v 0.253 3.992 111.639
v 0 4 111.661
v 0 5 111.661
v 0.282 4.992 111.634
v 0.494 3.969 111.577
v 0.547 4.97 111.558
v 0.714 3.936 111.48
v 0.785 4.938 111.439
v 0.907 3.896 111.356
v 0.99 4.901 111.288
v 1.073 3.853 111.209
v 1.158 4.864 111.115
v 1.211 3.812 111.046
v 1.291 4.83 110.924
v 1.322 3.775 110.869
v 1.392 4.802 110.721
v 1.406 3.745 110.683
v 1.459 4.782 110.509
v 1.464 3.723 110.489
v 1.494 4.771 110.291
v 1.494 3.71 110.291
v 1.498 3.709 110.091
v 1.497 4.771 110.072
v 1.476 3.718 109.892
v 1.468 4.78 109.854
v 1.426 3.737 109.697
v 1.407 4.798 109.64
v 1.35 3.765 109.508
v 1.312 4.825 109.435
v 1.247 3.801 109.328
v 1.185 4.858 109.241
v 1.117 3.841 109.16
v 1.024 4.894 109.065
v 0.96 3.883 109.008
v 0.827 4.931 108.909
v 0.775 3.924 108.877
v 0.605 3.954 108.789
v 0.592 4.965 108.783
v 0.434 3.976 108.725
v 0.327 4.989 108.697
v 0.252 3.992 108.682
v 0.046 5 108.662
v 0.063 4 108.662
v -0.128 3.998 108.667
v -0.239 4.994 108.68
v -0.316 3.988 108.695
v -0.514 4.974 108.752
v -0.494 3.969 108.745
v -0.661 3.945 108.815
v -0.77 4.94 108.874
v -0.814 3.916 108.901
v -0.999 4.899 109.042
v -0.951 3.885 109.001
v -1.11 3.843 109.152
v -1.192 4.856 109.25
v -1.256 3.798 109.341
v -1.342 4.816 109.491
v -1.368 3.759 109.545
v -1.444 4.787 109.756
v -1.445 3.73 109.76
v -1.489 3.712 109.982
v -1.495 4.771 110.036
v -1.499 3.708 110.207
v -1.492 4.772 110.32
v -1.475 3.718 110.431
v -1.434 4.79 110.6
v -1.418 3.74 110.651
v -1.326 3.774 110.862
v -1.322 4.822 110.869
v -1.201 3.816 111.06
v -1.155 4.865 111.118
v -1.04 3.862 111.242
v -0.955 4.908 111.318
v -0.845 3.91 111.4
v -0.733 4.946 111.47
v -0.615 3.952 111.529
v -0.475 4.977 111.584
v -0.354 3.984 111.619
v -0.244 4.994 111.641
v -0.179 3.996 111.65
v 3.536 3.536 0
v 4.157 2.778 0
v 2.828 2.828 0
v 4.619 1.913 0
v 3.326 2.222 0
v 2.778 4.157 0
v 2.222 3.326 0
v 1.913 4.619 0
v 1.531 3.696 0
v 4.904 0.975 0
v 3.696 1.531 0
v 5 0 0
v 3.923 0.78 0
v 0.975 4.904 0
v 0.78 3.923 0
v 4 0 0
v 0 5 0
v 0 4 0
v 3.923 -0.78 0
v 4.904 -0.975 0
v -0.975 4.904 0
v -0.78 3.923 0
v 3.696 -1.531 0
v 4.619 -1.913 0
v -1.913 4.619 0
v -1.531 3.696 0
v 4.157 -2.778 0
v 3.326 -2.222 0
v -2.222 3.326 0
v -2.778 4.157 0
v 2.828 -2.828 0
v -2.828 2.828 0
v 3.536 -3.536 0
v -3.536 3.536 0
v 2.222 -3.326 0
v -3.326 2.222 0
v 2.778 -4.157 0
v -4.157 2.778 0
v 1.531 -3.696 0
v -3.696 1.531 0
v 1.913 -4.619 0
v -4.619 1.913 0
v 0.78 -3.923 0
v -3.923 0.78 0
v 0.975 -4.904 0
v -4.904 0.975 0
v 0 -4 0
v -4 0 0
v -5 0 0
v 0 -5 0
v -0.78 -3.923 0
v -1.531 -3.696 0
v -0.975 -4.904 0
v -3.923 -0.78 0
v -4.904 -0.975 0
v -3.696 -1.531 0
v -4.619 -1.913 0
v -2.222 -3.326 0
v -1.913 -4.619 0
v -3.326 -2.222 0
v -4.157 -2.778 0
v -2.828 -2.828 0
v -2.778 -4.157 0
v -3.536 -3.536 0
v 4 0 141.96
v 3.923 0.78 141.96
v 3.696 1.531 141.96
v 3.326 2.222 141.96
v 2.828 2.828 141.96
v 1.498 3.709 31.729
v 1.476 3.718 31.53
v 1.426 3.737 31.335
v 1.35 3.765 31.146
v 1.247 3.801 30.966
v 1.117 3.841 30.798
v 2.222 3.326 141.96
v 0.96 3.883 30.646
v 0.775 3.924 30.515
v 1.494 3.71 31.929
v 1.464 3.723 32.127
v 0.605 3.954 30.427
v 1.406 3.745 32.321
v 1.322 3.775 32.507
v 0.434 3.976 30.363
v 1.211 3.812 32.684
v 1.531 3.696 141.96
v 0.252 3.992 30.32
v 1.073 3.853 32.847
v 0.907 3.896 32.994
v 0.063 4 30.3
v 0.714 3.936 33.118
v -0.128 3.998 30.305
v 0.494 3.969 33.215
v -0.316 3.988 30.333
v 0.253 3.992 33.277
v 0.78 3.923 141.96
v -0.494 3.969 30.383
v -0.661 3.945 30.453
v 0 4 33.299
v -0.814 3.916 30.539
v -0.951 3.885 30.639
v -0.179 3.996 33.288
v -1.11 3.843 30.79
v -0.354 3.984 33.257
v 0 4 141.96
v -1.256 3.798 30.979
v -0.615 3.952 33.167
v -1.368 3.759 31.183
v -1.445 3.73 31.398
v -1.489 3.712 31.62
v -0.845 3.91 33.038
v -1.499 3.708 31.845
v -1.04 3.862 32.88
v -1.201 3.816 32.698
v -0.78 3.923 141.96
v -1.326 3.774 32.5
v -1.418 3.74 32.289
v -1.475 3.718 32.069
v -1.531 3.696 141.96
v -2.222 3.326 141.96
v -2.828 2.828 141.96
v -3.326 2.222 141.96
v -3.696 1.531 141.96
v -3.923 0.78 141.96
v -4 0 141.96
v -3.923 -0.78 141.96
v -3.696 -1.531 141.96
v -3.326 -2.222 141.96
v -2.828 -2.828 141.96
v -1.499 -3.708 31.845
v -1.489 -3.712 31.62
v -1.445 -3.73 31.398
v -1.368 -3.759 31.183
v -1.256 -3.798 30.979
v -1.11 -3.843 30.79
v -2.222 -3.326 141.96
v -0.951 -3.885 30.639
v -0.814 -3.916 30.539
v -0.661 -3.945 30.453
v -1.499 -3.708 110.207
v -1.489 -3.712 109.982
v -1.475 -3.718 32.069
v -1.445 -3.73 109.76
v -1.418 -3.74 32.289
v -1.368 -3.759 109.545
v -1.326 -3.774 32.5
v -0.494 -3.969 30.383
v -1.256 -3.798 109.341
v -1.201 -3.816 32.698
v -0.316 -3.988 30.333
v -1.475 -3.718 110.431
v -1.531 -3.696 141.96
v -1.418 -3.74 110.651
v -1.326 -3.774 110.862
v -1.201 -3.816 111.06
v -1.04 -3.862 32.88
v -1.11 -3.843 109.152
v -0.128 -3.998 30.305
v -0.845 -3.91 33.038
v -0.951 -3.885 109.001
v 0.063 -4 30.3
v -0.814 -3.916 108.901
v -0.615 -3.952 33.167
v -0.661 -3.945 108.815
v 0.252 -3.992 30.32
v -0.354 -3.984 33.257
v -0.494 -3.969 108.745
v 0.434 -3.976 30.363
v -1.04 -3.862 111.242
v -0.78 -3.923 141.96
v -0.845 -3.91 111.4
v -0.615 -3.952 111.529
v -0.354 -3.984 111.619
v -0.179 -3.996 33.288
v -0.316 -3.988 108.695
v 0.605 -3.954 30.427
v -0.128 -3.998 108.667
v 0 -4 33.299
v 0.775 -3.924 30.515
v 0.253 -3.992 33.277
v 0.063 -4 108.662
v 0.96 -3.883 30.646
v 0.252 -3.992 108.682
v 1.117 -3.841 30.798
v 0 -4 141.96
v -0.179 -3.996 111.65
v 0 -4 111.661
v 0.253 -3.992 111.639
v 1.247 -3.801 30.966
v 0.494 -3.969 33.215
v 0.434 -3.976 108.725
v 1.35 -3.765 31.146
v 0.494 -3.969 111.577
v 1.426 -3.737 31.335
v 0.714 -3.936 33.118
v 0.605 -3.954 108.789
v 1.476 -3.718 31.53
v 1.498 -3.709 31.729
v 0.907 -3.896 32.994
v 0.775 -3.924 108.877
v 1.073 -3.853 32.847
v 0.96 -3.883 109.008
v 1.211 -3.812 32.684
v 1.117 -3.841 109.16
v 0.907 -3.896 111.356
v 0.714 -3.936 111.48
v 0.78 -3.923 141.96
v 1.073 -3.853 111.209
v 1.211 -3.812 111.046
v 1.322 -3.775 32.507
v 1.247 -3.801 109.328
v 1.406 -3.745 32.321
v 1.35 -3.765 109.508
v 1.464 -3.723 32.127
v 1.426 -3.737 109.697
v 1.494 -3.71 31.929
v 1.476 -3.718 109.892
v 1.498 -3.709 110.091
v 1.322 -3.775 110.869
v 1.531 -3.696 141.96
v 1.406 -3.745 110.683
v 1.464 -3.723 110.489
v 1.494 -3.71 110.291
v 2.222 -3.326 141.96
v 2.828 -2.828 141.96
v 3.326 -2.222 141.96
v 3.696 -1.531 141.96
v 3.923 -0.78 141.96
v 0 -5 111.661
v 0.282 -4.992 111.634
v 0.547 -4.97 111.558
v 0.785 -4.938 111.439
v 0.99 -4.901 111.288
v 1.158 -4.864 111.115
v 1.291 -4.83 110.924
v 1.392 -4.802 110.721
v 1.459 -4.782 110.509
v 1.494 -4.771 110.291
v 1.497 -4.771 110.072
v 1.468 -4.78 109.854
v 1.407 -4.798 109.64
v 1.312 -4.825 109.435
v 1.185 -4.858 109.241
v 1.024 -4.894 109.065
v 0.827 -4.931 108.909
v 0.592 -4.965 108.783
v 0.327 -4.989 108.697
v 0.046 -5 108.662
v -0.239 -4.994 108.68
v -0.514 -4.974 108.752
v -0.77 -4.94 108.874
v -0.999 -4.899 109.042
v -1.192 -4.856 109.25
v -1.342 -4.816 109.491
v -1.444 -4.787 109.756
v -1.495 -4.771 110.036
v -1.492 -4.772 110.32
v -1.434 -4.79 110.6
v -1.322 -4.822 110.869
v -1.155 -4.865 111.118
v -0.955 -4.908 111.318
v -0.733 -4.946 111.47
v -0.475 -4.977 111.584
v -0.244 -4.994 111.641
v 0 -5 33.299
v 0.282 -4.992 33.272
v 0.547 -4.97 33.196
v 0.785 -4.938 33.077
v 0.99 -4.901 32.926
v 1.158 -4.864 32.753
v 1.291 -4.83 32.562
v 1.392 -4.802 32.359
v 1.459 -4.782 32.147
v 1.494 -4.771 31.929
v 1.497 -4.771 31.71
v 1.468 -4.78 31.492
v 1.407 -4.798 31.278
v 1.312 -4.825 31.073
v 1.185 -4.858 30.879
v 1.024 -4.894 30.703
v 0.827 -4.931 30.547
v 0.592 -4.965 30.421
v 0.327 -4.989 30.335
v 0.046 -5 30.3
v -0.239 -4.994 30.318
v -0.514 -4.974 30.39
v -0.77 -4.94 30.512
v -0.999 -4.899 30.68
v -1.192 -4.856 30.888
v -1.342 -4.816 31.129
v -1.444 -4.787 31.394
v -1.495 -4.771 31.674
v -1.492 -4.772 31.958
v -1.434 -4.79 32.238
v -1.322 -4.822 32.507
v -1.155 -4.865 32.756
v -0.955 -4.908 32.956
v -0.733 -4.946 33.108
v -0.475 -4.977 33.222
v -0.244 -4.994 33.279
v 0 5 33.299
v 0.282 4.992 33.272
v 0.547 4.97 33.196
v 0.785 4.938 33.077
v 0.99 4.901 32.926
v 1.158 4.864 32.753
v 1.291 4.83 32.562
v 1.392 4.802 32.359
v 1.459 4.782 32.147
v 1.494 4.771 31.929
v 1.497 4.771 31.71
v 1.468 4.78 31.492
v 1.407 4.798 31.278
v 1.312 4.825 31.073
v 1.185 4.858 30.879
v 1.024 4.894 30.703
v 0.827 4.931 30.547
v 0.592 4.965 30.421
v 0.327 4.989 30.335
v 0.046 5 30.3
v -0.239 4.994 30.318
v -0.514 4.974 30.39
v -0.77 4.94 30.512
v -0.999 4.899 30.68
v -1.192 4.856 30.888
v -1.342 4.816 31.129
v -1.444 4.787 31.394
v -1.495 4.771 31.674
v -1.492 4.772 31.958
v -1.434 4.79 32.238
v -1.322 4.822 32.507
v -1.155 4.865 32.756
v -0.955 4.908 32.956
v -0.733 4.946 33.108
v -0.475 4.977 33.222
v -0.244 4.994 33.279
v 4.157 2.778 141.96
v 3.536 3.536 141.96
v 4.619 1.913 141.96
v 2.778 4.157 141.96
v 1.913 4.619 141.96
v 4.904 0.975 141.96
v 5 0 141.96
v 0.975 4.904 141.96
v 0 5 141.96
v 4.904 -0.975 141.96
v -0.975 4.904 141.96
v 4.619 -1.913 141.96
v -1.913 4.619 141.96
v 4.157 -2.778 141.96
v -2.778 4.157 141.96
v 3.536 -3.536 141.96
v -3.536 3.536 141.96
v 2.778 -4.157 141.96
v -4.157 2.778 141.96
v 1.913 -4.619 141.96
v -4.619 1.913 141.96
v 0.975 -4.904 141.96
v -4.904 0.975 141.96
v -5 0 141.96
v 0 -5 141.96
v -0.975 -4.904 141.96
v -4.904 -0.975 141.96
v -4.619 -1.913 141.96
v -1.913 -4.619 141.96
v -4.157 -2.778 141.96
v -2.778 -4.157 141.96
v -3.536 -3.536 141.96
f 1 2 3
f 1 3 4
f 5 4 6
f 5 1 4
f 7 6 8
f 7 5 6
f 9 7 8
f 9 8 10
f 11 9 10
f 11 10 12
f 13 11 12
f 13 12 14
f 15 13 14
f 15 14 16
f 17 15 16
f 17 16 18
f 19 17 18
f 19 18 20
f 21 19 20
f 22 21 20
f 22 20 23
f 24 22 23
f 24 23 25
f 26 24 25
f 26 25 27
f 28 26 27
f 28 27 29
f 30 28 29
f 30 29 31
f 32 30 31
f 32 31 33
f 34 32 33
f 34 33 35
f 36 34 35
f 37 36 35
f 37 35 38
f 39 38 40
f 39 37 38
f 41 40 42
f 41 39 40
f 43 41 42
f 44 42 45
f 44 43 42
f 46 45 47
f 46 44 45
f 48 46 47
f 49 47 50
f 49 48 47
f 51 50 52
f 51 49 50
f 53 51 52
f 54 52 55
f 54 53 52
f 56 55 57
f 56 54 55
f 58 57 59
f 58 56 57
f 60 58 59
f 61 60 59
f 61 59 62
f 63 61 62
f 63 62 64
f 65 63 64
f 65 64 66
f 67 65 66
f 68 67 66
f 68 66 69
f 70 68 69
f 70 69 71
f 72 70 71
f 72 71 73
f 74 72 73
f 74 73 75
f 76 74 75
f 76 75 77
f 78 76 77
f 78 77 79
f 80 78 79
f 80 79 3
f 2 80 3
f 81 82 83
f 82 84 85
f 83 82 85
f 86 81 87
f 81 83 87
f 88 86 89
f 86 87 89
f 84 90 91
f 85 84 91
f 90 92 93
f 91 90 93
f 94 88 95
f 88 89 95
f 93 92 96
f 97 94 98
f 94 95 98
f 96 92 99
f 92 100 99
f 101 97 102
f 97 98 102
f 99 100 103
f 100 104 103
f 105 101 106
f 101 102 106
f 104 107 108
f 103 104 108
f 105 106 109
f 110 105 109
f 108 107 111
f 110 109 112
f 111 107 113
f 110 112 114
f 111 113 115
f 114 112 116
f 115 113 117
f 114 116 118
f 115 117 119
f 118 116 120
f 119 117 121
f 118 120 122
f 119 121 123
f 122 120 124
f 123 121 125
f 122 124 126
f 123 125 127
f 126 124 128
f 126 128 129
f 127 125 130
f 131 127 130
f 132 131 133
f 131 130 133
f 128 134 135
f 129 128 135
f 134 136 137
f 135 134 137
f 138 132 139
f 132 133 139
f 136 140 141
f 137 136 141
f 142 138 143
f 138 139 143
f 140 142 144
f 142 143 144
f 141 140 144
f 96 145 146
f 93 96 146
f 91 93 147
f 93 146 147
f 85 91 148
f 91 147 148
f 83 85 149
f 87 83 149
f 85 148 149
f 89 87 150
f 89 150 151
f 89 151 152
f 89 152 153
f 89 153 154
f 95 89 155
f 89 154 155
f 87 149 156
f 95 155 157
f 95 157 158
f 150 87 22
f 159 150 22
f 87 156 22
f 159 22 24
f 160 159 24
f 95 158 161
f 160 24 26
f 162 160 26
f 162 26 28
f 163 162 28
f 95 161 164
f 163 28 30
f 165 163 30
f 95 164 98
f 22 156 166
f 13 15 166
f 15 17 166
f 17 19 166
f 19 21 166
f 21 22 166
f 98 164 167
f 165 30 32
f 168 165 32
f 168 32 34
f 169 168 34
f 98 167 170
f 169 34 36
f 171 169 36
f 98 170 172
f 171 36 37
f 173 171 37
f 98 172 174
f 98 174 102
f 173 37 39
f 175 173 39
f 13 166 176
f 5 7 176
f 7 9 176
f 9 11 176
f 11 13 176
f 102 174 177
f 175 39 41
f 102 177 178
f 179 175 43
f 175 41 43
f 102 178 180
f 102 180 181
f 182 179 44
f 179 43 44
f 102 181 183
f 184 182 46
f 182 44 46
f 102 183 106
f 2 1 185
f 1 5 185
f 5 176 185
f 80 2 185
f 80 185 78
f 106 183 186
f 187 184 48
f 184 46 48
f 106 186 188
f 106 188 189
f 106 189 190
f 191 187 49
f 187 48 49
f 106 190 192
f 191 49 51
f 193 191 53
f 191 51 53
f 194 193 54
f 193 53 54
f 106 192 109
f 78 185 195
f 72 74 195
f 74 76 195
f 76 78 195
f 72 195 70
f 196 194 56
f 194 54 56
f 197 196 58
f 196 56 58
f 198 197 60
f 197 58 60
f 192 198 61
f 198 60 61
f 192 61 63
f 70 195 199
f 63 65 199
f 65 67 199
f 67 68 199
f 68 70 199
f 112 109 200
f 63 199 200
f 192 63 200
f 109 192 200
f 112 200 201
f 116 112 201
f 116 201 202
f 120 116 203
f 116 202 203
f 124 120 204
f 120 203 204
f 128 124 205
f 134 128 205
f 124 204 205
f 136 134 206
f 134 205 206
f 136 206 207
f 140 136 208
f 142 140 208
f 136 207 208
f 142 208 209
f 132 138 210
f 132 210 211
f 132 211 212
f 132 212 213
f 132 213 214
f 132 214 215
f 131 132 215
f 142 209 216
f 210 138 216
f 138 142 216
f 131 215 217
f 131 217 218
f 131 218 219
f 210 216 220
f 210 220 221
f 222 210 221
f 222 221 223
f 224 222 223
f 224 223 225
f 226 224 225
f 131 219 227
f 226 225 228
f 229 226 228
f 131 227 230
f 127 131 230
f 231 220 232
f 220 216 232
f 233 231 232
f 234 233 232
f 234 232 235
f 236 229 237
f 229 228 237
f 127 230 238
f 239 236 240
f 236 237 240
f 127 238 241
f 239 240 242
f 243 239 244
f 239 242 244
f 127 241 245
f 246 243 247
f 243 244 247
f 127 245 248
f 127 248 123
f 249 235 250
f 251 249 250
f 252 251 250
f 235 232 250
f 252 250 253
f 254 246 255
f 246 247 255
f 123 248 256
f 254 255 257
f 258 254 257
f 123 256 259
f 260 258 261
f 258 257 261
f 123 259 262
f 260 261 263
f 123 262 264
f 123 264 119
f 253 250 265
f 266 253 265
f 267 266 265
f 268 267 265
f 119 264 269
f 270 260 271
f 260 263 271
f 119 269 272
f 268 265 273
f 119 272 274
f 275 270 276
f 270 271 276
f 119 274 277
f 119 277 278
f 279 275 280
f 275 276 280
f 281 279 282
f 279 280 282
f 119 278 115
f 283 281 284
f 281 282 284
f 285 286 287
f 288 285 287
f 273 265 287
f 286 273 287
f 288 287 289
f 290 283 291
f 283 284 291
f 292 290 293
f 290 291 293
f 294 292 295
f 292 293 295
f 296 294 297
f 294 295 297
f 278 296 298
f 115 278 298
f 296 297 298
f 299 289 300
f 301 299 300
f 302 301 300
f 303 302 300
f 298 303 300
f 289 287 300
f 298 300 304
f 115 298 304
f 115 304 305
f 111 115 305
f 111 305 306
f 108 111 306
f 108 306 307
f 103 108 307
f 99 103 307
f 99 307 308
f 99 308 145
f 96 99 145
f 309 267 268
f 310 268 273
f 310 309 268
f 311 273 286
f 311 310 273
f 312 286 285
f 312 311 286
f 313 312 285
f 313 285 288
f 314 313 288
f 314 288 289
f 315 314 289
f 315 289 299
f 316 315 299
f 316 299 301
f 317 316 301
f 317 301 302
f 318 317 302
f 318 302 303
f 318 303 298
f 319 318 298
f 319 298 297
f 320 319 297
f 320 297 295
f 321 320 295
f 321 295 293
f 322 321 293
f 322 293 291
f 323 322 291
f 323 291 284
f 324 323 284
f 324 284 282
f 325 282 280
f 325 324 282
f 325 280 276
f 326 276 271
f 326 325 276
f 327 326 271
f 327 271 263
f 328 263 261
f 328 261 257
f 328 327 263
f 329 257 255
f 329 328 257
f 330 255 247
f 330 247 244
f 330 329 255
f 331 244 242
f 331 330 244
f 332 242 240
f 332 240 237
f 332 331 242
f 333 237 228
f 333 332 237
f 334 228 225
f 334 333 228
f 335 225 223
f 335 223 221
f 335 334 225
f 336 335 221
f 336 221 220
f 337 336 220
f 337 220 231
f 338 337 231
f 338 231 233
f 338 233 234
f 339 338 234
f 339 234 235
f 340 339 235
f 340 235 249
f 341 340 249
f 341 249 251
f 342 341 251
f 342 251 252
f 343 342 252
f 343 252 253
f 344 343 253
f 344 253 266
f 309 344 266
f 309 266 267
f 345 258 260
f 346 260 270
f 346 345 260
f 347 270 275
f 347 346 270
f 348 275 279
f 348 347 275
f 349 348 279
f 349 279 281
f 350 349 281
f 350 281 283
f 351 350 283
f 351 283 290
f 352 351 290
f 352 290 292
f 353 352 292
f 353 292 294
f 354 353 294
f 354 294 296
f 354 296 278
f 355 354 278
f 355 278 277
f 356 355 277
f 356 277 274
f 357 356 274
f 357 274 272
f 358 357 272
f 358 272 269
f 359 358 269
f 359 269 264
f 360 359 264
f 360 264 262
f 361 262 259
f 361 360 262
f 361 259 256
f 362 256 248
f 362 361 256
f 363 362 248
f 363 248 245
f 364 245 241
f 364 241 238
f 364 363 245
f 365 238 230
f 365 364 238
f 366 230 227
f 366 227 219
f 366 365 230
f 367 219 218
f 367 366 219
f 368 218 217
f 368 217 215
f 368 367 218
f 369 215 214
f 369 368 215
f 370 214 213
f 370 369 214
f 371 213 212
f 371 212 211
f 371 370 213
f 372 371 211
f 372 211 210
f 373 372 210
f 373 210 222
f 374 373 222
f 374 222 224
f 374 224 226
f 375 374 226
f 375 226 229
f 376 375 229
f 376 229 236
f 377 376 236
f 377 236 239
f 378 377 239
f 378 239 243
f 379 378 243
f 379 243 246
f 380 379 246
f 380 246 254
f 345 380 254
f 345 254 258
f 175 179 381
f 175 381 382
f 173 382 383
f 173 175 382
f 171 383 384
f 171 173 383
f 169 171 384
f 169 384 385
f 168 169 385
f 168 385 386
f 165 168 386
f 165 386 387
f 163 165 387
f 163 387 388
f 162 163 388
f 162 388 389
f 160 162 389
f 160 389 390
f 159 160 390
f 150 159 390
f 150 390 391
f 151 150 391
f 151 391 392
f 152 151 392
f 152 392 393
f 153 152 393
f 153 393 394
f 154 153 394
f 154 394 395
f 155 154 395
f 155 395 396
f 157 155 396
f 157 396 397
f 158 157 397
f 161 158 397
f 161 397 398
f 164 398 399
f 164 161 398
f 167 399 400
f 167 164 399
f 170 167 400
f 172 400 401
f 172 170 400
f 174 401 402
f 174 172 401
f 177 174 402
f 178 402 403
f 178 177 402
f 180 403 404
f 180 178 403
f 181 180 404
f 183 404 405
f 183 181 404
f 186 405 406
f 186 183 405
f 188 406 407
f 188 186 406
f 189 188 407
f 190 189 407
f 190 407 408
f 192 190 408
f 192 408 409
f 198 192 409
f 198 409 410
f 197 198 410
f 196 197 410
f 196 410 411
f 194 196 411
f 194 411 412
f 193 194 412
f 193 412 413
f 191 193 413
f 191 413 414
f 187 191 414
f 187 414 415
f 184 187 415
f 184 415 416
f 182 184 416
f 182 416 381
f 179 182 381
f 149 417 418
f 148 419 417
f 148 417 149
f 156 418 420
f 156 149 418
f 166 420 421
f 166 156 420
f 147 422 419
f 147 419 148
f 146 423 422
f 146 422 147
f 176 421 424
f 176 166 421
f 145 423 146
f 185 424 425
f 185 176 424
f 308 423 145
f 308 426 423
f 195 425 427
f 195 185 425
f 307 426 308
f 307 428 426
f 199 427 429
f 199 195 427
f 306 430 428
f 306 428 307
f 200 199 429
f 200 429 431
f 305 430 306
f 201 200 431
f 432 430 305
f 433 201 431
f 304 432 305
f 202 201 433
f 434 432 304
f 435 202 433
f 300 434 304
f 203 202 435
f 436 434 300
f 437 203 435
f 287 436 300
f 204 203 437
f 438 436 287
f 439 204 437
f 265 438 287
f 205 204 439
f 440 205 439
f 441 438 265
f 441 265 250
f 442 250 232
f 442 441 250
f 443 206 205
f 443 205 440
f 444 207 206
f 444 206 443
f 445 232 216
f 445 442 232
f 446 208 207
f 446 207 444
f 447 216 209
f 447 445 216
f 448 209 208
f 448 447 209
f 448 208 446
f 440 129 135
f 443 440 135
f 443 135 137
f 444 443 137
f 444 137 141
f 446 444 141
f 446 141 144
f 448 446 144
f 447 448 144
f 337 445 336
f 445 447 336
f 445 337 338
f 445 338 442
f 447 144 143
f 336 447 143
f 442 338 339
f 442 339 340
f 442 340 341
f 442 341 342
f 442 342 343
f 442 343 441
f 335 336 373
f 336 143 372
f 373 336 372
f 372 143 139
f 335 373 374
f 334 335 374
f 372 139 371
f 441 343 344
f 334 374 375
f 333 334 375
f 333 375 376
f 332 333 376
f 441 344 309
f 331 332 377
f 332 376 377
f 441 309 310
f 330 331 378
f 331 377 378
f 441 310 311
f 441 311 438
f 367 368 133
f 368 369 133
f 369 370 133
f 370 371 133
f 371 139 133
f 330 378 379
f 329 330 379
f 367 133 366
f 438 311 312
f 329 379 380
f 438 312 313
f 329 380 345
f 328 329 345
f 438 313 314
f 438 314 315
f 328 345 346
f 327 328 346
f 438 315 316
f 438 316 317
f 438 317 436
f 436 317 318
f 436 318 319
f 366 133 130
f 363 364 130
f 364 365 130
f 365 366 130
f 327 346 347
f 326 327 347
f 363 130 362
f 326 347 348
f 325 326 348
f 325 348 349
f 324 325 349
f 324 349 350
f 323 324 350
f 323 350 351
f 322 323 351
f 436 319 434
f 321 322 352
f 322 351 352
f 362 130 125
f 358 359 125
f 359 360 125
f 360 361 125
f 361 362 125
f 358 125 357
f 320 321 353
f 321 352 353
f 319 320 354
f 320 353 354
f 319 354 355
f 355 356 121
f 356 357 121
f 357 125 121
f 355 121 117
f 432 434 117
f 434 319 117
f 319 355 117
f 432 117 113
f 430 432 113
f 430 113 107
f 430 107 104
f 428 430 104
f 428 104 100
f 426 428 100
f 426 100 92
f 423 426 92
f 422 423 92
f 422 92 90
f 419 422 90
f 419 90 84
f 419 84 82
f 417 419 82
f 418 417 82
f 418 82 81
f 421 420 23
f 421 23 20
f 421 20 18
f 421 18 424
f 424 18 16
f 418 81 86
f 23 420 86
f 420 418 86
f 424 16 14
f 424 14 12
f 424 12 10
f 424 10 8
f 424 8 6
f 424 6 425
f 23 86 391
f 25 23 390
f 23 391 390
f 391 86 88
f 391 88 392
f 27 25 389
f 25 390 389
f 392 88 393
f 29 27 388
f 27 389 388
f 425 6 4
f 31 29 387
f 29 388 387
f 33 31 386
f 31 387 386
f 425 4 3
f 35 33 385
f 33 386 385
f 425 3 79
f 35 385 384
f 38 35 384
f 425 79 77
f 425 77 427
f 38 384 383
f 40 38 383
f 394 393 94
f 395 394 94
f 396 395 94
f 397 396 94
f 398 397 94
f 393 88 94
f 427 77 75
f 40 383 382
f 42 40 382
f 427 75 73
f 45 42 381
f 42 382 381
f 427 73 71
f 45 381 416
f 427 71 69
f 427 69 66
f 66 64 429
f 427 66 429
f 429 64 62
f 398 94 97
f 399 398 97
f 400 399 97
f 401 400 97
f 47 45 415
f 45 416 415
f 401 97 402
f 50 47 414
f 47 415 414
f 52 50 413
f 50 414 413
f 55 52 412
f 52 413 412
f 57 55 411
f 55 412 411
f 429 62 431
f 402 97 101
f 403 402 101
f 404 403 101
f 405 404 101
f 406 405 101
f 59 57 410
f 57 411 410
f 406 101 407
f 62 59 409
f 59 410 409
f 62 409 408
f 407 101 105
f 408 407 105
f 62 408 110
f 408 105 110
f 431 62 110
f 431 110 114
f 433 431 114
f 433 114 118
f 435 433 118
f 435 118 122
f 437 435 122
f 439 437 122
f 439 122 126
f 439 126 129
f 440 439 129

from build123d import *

# Parameters (mm, degrees)
SKETCH1_R               = 5
BOSS_EXTRUDE1_DEPTH     = 141.96
CUT_EXTRUDE1_REACH      = 144.136
SKETCH2_R               = 4
CUT_EXTRUDE2_DEPTH      = 143.135996848
CUT_EXTRUDE2_DEPTH_BACK = 143.135996848
SKETCH5_R               = 1.5


with BuildPart() as part:
    # Sketch1 → Boss-Extrude1 (new body)
    with BuildSketch(Plane.XY):
        with Locations(Location((0, 0, 0), (0, 0, 180))):
            Circle(SKETCH1_R)
    extrude(amount=BOSS_EXTRUDE1_DEPTH)

    # Sketch2 → Cut-Extrude1 (cut, up to next)
    with BuildSketch(Plane.XY.offset(141.96), mode=Mode.PRIVATE) as cut_extrude1_sk1:
        Circle(SKETCH2_R)
    cut_extrude1_tool1 = extrude(cut_extrude1_sk1.sketch, amount=-CUT_EXTRUDE1_REACH, mode=Mode.PRIVATE) & part.part
    add(cut_extrude1_tool1.solids().sort_by_distance((0, 0, 141.96))[0], mode=Mode.SUBTRACT)

    # Sketch5 → Cut-Extrude2 (cut, two sides: drawn at the far end of the back side and taken through both)
    with BuildSketch(Plane(origin=(0, 0, 0), x_dir=(1, 0, 0), z_dir=(0, 1, 0)).offset(-CUT_EXTRUDE2_DEPTH_BACK)):
        with Locations(Location((0, -31.799, 0), (0, 0, 270))):
            Circle(SKETCH5_R)
        with Locations(Location((0, -110.161, 0), (0, 0, 270))):
            Circle(SKETCH5_R)
    extrude(amount=CUT_EXTRUDE2_DEPTH + CUT_EXTRUDE2_DEPTH_BACK, mode=Mode.SUBTRACT)


solid = part.part
